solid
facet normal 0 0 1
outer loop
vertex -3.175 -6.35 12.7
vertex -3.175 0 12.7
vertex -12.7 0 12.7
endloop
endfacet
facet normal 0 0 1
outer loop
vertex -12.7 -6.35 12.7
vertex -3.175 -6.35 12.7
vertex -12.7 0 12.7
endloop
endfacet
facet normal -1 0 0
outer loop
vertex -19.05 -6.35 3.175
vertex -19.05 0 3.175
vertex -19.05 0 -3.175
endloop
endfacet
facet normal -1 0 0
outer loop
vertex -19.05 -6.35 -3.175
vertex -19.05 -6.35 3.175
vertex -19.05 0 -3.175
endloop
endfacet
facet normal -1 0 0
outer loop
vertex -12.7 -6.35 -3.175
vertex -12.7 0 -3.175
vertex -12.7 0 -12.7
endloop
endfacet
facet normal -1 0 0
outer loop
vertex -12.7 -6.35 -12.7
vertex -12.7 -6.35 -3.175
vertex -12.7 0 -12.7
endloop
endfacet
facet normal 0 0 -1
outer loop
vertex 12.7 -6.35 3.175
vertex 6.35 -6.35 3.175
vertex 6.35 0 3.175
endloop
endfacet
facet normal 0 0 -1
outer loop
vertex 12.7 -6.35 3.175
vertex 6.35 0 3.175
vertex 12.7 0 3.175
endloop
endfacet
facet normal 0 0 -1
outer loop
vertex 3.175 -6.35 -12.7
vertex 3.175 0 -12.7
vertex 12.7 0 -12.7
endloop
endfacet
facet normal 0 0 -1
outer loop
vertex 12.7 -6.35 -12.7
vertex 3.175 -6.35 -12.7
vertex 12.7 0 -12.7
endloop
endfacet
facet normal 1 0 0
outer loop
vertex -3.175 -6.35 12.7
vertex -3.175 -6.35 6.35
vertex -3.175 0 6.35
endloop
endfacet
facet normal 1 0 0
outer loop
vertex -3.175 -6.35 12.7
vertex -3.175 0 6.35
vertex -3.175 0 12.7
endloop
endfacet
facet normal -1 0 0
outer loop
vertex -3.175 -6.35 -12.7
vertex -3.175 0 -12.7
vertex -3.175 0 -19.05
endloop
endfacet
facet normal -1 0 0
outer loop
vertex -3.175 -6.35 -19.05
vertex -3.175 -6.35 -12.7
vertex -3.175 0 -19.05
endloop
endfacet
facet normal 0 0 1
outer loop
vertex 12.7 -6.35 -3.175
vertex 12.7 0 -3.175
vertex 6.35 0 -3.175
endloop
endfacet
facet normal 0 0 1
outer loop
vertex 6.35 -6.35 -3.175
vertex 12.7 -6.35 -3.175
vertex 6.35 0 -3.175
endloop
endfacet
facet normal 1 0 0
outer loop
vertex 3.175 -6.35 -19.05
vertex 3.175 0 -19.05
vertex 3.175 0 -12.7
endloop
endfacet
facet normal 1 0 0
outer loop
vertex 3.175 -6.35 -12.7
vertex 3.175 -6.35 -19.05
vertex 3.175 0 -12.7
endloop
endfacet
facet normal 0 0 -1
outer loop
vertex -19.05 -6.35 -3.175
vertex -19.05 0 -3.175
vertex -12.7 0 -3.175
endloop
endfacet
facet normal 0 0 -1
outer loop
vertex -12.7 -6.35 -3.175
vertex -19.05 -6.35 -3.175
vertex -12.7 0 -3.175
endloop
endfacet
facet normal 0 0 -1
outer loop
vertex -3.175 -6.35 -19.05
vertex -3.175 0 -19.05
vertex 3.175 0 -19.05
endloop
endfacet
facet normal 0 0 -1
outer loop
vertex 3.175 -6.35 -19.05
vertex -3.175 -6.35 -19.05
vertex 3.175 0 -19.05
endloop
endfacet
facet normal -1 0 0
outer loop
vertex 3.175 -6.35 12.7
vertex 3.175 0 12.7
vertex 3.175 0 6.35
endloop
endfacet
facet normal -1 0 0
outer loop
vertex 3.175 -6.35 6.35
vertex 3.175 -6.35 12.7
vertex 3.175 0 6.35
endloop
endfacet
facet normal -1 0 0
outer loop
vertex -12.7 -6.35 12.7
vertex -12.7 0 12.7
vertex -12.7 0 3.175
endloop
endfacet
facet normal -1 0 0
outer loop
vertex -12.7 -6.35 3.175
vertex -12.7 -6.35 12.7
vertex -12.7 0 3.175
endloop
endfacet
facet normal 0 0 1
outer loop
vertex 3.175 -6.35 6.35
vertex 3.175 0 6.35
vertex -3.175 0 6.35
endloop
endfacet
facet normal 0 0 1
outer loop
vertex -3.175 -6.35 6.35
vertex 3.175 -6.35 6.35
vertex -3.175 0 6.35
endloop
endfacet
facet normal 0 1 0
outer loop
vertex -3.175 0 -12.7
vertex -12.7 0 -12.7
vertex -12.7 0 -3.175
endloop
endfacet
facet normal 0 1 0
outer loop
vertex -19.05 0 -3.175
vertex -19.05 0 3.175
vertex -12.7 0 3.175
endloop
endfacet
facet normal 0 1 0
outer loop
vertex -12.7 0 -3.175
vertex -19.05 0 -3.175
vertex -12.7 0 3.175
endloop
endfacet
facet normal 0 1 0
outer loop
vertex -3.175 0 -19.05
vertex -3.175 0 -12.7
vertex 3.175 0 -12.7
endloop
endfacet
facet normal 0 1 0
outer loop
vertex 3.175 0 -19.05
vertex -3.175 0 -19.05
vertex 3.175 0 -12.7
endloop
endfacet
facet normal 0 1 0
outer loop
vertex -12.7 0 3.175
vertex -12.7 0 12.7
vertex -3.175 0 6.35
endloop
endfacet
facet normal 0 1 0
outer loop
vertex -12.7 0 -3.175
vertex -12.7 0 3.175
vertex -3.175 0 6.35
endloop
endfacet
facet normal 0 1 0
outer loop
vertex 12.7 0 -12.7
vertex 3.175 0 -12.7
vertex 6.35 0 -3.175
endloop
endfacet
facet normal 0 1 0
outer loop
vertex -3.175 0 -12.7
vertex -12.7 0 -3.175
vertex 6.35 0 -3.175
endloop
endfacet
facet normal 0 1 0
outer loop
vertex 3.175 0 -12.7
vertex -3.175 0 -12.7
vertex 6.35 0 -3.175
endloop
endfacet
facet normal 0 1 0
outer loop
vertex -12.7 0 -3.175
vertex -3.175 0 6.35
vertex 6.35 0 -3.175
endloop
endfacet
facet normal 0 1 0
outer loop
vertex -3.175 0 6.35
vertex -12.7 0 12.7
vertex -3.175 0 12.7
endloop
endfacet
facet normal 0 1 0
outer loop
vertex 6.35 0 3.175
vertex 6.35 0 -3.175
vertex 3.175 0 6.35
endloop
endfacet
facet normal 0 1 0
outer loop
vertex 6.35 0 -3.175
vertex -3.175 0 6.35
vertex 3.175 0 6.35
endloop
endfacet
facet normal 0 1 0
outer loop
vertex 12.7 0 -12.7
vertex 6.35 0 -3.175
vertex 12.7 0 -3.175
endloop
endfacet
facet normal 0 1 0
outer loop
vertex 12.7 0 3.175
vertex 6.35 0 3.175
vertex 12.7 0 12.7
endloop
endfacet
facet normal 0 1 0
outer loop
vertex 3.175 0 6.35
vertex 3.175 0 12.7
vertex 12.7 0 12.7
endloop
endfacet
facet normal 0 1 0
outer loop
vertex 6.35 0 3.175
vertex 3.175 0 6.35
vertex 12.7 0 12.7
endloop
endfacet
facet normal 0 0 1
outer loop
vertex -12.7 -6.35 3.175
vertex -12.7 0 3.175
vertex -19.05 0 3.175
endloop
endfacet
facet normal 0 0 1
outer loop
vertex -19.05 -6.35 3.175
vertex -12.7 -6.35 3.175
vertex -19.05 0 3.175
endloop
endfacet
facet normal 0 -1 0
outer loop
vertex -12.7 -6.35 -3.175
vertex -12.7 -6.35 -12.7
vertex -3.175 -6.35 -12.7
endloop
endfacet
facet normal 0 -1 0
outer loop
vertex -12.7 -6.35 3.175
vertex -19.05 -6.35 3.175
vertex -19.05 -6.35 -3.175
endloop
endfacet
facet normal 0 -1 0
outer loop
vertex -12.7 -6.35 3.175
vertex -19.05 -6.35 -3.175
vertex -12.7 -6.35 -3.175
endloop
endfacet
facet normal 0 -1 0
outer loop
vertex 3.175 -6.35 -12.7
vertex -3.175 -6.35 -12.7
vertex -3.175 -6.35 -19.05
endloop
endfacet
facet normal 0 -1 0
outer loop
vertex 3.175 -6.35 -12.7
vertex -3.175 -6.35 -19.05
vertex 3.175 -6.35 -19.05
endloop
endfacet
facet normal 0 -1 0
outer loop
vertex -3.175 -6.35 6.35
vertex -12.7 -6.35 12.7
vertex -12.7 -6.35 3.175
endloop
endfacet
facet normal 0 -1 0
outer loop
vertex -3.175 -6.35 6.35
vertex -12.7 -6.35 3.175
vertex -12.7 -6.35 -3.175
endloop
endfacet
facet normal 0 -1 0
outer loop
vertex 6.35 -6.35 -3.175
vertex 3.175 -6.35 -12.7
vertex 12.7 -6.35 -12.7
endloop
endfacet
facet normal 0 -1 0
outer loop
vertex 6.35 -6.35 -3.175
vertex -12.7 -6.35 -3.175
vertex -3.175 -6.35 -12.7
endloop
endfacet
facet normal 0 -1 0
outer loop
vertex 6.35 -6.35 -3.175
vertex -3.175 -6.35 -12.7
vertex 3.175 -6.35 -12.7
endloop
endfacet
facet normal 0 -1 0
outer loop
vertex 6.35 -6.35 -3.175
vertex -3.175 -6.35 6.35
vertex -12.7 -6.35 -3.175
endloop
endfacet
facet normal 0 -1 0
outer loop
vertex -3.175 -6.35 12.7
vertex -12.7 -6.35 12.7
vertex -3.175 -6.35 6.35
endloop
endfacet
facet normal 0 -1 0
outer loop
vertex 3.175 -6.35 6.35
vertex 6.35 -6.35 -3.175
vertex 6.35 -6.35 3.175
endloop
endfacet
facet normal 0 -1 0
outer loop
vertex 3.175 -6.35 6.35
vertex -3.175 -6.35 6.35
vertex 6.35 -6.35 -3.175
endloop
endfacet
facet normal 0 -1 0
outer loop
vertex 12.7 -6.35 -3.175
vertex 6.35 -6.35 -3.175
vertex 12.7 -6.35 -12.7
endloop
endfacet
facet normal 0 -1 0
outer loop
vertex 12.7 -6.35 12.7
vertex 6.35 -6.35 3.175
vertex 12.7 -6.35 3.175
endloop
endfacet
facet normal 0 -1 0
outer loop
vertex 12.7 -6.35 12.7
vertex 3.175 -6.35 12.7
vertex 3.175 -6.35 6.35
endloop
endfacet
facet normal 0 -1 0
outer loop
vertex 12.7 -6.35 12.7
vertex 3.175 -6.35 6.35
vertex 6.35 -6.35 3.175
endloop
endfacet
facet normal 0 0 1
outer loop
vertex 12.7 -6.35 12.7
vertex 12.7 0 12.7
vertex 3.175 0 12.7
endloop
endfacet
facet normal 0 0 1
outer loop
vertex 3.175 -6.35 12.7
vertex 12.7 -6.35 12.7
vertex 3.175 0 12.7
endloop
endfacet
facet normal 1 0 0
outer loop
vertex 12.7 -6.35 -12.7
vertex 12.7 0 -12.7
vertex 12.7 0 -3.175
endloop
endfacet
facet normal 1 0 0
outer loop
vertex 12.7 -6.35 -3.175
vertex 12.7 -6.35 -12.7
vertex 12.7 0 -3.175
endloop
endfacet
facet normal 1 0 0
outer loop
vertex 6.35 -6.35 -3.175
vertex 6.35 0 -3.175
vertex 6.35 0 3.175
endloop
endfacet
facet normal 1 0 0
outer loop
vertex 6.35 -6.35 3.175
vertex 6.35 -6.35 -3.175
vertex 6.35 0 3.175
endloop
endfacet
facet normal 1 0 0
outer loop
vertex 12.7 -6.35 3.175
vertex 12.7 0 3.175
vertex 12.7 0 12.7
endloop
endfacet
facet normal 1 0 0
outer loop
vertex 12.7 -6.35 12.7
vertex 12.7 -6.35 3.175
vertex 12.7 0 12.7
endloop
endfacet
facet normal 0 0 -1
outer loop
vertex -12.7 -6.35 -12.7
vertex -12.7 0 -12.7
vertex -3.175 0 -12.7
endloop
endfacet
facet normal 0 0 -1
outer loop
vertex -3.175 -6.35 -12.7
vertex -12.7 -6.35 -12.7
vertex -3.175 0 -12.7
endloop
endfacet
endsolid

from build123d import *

# Parameters (mm, degrees)
F1_DEPTH = 6.35


with BuildPart() as f1:
    # F0 (on Front) → F1 (new body)
    with BuildSketch(Plane.XZ):
        Polygon((-3.175, 6.35), (-3.175, 12.7), (-12.7, 12.7), (-12.7, 3.175), (-19.05, 3.175), (-19.05, -3.175), (-12.7, -3.175), (-12.7, -12.7), (-3.175, -12.7), (-3.175, -19.05), (3.175, -19.05), (3.175, -12.7), (12.7, -12.7), (12.7, -3.175), (6.35, -3.175), (6.35, 3.175), (12.7, 3.175), (12.7, 12.7), (3.175, 12.7), (3.175, 6.35), (0, 6.35), align=None)
    extrude(amount=F1_DEPTH)


solid = f1.part
